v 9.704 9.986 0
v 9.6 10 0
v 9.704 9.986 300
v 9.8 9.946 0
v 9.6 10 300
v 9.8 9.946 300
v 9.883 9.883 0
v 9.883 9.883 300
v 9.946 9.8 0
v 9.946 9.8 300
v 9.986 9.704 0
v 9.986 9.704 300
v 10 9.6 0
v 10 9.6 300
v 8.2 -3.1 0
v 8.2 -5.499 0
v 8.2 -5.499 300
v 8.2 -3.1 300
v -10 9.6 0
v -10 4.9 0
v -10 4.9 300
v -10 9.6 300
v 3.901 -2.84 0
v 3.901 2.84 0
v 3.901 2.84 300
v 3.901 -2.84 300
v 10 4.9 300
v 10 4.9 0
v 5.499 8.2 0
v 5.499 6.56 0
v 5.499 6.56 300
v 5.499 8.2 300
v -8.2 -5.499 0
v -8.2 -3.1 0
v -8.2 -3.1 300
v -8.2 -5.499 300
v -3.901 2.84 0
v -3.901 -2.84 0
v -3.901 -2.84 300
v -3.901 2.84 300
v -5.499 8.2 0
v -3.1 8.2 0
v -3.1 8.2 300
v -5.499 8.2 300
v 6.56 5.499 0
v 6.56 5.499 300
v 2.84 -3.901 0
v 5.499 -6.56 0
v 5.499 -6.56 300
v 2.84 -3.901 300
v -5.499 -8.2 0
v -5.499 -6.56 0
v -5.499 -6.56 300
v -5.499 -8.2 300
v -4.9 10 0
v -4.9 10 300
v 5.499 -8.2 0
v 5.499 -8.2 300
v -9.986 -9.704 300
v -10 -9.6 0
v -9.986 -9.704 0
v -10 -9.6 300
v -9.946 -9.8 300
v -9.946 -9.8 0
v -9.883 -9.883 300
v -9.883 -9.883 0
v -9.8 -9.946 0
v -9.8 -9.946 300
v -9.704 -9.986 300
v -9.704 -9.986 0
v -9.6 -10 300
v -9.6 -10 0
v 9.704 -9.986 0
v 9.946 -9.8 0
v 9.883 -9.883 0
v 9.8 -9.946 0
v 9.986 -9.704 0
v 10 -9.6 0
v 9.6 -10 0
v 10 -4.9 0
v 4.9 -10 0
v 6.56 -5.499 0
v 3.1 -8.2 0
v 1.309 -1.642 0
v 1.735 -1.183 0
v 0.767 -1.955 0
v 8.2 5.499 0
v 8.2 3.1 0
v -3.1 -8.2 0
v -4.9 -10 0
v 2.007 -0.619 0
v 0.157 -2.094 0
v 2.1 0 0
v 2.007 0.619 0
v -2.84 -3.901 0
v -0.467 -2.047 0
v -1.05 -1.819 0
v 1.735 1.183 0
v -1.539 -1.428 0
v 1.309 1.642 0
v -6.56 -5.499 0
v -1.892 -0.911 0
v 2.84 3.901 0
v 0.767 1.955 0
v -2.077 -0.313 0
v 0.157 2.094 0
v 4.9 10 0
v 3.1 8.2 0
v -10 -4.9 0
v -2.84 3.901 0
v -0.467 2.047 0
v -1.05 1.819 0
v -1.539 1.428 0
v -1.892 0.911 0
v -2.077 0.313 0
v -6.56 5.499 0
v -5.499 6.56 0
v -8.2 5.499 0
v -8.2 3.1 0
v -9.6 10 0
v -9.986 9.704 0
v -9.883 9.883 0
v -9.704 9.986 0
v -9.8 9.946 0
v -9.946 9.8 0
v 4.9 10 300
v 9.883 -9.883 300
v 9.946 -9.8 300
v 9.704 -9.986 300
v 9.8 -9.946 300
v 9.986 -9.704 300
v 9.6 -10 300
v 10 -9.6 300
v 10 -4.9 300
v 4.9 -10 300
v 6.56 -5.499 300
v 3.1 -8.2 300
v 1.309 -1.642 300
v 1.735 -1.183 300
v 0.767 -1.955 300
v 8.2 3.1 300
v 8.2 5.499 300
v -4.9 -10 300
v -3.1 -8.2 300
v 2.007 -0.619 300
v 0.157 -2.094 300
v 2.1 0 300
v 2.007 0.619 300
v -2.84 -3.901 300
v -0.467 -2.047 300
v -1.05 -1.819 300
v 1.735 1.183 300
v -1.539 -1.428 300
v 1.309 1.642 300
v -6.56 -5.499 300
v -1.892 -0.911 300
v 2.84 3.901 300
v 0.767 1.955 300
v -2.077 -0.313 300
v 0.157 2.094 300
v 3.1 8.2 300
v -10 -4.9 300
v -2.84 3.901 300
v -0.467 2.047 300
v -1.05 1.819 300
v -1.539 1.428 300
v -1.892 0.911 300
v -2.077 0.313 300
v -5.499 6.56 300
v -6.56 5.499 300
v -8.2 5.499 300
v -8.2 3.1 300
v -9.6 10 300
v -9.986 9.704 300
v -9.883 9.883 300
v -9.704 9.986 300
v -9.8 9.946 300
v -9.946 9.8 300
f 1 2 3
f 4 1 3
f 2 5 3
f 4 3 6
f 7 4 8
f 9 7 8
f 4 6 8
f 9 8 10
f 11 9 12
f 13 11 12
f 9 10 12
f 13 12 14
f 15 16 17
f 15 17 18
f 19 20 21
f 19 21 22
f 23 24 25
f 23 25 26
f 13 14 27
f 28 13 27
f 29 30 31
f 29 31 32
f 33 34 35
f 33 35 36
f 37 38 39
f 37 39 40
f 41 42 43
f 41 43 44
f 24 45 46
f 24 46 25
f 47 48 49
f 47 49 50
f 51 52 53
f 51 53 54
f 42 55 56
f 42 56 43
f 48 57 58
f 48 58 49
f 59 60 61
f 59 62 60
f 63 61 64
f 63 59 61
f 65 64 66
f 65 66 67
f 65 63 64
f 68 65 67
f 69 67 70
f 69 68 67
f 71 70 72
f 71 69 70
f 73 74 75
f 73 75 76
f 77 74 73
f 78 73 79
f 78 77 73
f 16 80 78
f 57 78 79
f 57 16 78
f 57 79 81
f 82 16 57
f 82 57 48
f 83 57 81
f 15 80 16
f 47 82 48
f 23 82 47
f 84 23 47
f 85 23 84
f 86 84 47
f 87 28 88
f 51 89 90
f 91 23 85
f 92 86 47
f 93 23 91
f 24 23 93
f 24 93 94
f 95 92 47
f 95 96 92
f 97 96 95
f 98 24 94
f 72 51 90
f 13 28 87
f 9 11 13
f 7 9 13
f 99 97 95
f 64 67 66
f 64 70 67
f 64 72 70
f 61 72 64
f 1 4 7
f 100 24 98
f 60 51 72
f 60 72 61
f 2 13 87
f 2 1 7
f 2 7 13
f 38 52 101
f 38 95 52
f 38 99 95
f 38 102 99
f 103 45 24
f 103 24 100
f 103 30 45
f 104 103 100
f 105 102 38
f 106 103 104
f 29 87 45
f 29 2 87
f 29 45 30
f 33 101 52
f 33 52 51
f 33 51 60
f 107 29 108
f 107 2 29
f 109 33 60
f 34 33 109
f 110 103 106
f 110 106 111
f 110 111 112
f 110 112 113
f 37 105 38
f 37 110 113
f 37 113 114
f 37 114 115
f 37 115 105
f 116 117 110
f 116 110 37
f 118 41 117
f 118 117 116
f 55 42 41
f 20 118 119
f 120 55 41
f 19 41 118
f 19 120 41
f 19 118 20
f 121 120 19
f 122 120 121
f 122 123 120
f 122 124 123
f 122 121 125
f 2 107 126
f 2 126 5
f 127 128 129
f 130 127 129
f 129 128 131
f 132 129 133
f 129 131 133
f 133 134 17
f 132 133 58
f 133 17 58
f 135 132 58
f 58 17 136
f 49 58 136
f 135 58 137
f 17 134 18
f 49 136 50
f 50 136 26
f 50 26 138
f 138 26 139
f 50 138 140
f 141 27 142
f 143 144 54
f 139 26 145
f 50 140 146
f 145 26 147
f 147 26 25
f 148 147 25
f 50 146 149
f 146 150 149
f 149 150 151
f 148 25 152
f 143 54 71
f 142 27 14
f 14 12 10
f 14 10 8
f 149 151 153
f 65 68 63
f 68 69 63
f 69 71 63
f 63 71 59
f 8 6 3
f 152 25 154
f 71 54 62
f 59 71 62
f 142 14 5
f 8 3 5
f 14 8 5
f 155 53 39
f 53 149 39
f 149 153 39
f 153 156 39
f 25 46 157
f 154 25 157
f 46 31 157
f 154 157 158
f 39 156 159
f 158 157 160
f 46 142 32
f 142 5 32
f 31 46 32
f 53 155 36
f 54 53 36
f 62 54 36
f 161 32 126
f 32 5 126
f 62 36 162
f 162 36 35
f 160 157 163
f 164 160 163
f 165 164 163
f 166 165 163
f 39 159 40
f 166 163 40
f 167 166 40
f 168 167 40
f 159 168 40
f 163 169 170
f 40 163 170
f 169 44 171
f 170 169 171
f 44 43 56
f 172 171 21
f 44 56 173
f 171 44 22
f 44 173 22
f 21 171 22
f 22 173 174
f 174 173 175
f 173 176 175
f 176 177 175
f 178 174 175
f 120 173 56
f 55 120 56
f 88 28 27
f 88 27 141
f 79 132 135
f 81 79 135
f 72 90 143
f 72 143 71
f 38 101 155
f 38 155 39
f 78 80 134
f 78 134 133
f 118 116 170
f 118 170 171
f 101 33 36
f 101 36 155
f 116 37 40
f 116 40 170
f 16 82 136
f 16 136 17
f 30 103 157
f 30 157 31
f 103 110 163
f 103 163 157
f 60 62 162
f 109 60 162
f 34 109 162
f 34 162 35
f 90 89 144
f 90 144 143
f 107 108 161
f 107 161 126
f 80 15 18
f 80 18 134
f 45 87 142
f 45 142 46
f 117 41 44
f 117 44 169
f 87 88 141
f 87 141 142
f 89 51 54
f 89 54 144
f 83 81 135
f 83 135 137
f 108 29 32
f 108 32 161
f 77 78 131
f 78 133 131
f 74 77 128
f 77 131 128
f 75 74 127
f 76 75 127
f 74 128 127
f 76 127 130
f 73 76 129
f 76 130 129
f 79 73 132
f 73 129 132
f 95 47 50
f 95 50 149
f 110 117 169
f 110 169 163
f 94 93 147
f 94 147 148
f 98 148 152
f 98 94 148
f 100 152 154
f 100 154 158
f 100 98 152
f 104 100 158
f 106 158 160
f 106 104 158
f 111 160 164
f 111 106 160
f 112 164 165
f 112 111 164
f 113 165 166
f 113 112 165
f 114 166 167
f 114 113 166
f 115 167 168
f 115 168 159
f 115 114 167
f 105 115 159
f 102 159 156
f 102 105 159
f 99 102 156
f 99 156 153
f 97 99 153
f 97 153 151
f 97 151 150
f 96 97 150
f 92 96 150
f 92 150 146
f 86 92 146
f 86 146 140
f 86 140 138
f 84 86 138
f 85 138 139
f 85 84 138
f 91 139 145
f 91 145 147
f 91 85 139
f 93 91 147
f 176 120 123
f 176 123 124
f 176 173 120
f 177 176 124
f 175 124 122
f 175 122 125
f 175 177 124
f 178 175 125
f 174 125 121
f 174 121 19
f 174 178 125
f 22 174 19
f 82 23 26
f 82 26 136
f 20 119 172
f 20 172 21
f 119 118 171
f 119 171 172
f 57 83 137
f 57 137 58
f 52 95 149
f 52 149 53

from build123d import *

# Parameters (mm, degrees)
SKETCH_R  = 2.1
PAD_DEPTH = 300
FILLET_R  = 0.4


with BuildPart() as part:
    # Sketch → Pad (new body)
    with BuildSketch(Plane.XY):
        Polygon((-2.84, 3.90066), (2.84, 3.90066), (5.49934, 6.56), (5.49934, 8.2), (3.1, 8.2), (4.9, 10), (10, 10), (10, 4.9), (8.2, 3.1), (8.2, 5.49934), (6.56, 5.49934), (3.90066, 2.84), (3.90066, -2.84), (6.56, -5.49934), (8.2, -5.49934), (8.2, -3.1), (10, -4.9), (10, -10), (4.9, -10), (3.1, -8.2), (5.49934, -8.2), (5.49934, -6.56), (2.84, -3.90066), (-2.84, -3.90066), (-5.49934, -6.56), (-5.49934, -8.2), (-3.1, -8.2), (-4.9, -10), (-10, -10), (-10, -4.9), (-8.2, -3.1), (-8.2, -5.49934), (-6.56, -5.49934), (-3.90066, -2.84), (-3.90066, 2.84), (-6.56, 5.49934), (-8.2, 5.49934), (-8.2, 3.1), (-10, 4.9), (-10, 10), (-4.9, 10), (-3.1, 8.2), (-5.49934, 8.2), (-5.49934, 6.56), align=None)
        Circle(SKETCH_R, mode=Mode.SUBTRACT)
    extrude(amount=PAD_DEPTH)

    # Fillet
    fillet_edges = [part.edges().sort_by_distance(p)[0] for p in [
        (10, 10, 150),
        (-10, 10, 150),
        (10, -10, 150),
        (-10, -10, 150),
    ]]
    fillet(fillet_edges, radius=FILLET_R)


solid = part.part
